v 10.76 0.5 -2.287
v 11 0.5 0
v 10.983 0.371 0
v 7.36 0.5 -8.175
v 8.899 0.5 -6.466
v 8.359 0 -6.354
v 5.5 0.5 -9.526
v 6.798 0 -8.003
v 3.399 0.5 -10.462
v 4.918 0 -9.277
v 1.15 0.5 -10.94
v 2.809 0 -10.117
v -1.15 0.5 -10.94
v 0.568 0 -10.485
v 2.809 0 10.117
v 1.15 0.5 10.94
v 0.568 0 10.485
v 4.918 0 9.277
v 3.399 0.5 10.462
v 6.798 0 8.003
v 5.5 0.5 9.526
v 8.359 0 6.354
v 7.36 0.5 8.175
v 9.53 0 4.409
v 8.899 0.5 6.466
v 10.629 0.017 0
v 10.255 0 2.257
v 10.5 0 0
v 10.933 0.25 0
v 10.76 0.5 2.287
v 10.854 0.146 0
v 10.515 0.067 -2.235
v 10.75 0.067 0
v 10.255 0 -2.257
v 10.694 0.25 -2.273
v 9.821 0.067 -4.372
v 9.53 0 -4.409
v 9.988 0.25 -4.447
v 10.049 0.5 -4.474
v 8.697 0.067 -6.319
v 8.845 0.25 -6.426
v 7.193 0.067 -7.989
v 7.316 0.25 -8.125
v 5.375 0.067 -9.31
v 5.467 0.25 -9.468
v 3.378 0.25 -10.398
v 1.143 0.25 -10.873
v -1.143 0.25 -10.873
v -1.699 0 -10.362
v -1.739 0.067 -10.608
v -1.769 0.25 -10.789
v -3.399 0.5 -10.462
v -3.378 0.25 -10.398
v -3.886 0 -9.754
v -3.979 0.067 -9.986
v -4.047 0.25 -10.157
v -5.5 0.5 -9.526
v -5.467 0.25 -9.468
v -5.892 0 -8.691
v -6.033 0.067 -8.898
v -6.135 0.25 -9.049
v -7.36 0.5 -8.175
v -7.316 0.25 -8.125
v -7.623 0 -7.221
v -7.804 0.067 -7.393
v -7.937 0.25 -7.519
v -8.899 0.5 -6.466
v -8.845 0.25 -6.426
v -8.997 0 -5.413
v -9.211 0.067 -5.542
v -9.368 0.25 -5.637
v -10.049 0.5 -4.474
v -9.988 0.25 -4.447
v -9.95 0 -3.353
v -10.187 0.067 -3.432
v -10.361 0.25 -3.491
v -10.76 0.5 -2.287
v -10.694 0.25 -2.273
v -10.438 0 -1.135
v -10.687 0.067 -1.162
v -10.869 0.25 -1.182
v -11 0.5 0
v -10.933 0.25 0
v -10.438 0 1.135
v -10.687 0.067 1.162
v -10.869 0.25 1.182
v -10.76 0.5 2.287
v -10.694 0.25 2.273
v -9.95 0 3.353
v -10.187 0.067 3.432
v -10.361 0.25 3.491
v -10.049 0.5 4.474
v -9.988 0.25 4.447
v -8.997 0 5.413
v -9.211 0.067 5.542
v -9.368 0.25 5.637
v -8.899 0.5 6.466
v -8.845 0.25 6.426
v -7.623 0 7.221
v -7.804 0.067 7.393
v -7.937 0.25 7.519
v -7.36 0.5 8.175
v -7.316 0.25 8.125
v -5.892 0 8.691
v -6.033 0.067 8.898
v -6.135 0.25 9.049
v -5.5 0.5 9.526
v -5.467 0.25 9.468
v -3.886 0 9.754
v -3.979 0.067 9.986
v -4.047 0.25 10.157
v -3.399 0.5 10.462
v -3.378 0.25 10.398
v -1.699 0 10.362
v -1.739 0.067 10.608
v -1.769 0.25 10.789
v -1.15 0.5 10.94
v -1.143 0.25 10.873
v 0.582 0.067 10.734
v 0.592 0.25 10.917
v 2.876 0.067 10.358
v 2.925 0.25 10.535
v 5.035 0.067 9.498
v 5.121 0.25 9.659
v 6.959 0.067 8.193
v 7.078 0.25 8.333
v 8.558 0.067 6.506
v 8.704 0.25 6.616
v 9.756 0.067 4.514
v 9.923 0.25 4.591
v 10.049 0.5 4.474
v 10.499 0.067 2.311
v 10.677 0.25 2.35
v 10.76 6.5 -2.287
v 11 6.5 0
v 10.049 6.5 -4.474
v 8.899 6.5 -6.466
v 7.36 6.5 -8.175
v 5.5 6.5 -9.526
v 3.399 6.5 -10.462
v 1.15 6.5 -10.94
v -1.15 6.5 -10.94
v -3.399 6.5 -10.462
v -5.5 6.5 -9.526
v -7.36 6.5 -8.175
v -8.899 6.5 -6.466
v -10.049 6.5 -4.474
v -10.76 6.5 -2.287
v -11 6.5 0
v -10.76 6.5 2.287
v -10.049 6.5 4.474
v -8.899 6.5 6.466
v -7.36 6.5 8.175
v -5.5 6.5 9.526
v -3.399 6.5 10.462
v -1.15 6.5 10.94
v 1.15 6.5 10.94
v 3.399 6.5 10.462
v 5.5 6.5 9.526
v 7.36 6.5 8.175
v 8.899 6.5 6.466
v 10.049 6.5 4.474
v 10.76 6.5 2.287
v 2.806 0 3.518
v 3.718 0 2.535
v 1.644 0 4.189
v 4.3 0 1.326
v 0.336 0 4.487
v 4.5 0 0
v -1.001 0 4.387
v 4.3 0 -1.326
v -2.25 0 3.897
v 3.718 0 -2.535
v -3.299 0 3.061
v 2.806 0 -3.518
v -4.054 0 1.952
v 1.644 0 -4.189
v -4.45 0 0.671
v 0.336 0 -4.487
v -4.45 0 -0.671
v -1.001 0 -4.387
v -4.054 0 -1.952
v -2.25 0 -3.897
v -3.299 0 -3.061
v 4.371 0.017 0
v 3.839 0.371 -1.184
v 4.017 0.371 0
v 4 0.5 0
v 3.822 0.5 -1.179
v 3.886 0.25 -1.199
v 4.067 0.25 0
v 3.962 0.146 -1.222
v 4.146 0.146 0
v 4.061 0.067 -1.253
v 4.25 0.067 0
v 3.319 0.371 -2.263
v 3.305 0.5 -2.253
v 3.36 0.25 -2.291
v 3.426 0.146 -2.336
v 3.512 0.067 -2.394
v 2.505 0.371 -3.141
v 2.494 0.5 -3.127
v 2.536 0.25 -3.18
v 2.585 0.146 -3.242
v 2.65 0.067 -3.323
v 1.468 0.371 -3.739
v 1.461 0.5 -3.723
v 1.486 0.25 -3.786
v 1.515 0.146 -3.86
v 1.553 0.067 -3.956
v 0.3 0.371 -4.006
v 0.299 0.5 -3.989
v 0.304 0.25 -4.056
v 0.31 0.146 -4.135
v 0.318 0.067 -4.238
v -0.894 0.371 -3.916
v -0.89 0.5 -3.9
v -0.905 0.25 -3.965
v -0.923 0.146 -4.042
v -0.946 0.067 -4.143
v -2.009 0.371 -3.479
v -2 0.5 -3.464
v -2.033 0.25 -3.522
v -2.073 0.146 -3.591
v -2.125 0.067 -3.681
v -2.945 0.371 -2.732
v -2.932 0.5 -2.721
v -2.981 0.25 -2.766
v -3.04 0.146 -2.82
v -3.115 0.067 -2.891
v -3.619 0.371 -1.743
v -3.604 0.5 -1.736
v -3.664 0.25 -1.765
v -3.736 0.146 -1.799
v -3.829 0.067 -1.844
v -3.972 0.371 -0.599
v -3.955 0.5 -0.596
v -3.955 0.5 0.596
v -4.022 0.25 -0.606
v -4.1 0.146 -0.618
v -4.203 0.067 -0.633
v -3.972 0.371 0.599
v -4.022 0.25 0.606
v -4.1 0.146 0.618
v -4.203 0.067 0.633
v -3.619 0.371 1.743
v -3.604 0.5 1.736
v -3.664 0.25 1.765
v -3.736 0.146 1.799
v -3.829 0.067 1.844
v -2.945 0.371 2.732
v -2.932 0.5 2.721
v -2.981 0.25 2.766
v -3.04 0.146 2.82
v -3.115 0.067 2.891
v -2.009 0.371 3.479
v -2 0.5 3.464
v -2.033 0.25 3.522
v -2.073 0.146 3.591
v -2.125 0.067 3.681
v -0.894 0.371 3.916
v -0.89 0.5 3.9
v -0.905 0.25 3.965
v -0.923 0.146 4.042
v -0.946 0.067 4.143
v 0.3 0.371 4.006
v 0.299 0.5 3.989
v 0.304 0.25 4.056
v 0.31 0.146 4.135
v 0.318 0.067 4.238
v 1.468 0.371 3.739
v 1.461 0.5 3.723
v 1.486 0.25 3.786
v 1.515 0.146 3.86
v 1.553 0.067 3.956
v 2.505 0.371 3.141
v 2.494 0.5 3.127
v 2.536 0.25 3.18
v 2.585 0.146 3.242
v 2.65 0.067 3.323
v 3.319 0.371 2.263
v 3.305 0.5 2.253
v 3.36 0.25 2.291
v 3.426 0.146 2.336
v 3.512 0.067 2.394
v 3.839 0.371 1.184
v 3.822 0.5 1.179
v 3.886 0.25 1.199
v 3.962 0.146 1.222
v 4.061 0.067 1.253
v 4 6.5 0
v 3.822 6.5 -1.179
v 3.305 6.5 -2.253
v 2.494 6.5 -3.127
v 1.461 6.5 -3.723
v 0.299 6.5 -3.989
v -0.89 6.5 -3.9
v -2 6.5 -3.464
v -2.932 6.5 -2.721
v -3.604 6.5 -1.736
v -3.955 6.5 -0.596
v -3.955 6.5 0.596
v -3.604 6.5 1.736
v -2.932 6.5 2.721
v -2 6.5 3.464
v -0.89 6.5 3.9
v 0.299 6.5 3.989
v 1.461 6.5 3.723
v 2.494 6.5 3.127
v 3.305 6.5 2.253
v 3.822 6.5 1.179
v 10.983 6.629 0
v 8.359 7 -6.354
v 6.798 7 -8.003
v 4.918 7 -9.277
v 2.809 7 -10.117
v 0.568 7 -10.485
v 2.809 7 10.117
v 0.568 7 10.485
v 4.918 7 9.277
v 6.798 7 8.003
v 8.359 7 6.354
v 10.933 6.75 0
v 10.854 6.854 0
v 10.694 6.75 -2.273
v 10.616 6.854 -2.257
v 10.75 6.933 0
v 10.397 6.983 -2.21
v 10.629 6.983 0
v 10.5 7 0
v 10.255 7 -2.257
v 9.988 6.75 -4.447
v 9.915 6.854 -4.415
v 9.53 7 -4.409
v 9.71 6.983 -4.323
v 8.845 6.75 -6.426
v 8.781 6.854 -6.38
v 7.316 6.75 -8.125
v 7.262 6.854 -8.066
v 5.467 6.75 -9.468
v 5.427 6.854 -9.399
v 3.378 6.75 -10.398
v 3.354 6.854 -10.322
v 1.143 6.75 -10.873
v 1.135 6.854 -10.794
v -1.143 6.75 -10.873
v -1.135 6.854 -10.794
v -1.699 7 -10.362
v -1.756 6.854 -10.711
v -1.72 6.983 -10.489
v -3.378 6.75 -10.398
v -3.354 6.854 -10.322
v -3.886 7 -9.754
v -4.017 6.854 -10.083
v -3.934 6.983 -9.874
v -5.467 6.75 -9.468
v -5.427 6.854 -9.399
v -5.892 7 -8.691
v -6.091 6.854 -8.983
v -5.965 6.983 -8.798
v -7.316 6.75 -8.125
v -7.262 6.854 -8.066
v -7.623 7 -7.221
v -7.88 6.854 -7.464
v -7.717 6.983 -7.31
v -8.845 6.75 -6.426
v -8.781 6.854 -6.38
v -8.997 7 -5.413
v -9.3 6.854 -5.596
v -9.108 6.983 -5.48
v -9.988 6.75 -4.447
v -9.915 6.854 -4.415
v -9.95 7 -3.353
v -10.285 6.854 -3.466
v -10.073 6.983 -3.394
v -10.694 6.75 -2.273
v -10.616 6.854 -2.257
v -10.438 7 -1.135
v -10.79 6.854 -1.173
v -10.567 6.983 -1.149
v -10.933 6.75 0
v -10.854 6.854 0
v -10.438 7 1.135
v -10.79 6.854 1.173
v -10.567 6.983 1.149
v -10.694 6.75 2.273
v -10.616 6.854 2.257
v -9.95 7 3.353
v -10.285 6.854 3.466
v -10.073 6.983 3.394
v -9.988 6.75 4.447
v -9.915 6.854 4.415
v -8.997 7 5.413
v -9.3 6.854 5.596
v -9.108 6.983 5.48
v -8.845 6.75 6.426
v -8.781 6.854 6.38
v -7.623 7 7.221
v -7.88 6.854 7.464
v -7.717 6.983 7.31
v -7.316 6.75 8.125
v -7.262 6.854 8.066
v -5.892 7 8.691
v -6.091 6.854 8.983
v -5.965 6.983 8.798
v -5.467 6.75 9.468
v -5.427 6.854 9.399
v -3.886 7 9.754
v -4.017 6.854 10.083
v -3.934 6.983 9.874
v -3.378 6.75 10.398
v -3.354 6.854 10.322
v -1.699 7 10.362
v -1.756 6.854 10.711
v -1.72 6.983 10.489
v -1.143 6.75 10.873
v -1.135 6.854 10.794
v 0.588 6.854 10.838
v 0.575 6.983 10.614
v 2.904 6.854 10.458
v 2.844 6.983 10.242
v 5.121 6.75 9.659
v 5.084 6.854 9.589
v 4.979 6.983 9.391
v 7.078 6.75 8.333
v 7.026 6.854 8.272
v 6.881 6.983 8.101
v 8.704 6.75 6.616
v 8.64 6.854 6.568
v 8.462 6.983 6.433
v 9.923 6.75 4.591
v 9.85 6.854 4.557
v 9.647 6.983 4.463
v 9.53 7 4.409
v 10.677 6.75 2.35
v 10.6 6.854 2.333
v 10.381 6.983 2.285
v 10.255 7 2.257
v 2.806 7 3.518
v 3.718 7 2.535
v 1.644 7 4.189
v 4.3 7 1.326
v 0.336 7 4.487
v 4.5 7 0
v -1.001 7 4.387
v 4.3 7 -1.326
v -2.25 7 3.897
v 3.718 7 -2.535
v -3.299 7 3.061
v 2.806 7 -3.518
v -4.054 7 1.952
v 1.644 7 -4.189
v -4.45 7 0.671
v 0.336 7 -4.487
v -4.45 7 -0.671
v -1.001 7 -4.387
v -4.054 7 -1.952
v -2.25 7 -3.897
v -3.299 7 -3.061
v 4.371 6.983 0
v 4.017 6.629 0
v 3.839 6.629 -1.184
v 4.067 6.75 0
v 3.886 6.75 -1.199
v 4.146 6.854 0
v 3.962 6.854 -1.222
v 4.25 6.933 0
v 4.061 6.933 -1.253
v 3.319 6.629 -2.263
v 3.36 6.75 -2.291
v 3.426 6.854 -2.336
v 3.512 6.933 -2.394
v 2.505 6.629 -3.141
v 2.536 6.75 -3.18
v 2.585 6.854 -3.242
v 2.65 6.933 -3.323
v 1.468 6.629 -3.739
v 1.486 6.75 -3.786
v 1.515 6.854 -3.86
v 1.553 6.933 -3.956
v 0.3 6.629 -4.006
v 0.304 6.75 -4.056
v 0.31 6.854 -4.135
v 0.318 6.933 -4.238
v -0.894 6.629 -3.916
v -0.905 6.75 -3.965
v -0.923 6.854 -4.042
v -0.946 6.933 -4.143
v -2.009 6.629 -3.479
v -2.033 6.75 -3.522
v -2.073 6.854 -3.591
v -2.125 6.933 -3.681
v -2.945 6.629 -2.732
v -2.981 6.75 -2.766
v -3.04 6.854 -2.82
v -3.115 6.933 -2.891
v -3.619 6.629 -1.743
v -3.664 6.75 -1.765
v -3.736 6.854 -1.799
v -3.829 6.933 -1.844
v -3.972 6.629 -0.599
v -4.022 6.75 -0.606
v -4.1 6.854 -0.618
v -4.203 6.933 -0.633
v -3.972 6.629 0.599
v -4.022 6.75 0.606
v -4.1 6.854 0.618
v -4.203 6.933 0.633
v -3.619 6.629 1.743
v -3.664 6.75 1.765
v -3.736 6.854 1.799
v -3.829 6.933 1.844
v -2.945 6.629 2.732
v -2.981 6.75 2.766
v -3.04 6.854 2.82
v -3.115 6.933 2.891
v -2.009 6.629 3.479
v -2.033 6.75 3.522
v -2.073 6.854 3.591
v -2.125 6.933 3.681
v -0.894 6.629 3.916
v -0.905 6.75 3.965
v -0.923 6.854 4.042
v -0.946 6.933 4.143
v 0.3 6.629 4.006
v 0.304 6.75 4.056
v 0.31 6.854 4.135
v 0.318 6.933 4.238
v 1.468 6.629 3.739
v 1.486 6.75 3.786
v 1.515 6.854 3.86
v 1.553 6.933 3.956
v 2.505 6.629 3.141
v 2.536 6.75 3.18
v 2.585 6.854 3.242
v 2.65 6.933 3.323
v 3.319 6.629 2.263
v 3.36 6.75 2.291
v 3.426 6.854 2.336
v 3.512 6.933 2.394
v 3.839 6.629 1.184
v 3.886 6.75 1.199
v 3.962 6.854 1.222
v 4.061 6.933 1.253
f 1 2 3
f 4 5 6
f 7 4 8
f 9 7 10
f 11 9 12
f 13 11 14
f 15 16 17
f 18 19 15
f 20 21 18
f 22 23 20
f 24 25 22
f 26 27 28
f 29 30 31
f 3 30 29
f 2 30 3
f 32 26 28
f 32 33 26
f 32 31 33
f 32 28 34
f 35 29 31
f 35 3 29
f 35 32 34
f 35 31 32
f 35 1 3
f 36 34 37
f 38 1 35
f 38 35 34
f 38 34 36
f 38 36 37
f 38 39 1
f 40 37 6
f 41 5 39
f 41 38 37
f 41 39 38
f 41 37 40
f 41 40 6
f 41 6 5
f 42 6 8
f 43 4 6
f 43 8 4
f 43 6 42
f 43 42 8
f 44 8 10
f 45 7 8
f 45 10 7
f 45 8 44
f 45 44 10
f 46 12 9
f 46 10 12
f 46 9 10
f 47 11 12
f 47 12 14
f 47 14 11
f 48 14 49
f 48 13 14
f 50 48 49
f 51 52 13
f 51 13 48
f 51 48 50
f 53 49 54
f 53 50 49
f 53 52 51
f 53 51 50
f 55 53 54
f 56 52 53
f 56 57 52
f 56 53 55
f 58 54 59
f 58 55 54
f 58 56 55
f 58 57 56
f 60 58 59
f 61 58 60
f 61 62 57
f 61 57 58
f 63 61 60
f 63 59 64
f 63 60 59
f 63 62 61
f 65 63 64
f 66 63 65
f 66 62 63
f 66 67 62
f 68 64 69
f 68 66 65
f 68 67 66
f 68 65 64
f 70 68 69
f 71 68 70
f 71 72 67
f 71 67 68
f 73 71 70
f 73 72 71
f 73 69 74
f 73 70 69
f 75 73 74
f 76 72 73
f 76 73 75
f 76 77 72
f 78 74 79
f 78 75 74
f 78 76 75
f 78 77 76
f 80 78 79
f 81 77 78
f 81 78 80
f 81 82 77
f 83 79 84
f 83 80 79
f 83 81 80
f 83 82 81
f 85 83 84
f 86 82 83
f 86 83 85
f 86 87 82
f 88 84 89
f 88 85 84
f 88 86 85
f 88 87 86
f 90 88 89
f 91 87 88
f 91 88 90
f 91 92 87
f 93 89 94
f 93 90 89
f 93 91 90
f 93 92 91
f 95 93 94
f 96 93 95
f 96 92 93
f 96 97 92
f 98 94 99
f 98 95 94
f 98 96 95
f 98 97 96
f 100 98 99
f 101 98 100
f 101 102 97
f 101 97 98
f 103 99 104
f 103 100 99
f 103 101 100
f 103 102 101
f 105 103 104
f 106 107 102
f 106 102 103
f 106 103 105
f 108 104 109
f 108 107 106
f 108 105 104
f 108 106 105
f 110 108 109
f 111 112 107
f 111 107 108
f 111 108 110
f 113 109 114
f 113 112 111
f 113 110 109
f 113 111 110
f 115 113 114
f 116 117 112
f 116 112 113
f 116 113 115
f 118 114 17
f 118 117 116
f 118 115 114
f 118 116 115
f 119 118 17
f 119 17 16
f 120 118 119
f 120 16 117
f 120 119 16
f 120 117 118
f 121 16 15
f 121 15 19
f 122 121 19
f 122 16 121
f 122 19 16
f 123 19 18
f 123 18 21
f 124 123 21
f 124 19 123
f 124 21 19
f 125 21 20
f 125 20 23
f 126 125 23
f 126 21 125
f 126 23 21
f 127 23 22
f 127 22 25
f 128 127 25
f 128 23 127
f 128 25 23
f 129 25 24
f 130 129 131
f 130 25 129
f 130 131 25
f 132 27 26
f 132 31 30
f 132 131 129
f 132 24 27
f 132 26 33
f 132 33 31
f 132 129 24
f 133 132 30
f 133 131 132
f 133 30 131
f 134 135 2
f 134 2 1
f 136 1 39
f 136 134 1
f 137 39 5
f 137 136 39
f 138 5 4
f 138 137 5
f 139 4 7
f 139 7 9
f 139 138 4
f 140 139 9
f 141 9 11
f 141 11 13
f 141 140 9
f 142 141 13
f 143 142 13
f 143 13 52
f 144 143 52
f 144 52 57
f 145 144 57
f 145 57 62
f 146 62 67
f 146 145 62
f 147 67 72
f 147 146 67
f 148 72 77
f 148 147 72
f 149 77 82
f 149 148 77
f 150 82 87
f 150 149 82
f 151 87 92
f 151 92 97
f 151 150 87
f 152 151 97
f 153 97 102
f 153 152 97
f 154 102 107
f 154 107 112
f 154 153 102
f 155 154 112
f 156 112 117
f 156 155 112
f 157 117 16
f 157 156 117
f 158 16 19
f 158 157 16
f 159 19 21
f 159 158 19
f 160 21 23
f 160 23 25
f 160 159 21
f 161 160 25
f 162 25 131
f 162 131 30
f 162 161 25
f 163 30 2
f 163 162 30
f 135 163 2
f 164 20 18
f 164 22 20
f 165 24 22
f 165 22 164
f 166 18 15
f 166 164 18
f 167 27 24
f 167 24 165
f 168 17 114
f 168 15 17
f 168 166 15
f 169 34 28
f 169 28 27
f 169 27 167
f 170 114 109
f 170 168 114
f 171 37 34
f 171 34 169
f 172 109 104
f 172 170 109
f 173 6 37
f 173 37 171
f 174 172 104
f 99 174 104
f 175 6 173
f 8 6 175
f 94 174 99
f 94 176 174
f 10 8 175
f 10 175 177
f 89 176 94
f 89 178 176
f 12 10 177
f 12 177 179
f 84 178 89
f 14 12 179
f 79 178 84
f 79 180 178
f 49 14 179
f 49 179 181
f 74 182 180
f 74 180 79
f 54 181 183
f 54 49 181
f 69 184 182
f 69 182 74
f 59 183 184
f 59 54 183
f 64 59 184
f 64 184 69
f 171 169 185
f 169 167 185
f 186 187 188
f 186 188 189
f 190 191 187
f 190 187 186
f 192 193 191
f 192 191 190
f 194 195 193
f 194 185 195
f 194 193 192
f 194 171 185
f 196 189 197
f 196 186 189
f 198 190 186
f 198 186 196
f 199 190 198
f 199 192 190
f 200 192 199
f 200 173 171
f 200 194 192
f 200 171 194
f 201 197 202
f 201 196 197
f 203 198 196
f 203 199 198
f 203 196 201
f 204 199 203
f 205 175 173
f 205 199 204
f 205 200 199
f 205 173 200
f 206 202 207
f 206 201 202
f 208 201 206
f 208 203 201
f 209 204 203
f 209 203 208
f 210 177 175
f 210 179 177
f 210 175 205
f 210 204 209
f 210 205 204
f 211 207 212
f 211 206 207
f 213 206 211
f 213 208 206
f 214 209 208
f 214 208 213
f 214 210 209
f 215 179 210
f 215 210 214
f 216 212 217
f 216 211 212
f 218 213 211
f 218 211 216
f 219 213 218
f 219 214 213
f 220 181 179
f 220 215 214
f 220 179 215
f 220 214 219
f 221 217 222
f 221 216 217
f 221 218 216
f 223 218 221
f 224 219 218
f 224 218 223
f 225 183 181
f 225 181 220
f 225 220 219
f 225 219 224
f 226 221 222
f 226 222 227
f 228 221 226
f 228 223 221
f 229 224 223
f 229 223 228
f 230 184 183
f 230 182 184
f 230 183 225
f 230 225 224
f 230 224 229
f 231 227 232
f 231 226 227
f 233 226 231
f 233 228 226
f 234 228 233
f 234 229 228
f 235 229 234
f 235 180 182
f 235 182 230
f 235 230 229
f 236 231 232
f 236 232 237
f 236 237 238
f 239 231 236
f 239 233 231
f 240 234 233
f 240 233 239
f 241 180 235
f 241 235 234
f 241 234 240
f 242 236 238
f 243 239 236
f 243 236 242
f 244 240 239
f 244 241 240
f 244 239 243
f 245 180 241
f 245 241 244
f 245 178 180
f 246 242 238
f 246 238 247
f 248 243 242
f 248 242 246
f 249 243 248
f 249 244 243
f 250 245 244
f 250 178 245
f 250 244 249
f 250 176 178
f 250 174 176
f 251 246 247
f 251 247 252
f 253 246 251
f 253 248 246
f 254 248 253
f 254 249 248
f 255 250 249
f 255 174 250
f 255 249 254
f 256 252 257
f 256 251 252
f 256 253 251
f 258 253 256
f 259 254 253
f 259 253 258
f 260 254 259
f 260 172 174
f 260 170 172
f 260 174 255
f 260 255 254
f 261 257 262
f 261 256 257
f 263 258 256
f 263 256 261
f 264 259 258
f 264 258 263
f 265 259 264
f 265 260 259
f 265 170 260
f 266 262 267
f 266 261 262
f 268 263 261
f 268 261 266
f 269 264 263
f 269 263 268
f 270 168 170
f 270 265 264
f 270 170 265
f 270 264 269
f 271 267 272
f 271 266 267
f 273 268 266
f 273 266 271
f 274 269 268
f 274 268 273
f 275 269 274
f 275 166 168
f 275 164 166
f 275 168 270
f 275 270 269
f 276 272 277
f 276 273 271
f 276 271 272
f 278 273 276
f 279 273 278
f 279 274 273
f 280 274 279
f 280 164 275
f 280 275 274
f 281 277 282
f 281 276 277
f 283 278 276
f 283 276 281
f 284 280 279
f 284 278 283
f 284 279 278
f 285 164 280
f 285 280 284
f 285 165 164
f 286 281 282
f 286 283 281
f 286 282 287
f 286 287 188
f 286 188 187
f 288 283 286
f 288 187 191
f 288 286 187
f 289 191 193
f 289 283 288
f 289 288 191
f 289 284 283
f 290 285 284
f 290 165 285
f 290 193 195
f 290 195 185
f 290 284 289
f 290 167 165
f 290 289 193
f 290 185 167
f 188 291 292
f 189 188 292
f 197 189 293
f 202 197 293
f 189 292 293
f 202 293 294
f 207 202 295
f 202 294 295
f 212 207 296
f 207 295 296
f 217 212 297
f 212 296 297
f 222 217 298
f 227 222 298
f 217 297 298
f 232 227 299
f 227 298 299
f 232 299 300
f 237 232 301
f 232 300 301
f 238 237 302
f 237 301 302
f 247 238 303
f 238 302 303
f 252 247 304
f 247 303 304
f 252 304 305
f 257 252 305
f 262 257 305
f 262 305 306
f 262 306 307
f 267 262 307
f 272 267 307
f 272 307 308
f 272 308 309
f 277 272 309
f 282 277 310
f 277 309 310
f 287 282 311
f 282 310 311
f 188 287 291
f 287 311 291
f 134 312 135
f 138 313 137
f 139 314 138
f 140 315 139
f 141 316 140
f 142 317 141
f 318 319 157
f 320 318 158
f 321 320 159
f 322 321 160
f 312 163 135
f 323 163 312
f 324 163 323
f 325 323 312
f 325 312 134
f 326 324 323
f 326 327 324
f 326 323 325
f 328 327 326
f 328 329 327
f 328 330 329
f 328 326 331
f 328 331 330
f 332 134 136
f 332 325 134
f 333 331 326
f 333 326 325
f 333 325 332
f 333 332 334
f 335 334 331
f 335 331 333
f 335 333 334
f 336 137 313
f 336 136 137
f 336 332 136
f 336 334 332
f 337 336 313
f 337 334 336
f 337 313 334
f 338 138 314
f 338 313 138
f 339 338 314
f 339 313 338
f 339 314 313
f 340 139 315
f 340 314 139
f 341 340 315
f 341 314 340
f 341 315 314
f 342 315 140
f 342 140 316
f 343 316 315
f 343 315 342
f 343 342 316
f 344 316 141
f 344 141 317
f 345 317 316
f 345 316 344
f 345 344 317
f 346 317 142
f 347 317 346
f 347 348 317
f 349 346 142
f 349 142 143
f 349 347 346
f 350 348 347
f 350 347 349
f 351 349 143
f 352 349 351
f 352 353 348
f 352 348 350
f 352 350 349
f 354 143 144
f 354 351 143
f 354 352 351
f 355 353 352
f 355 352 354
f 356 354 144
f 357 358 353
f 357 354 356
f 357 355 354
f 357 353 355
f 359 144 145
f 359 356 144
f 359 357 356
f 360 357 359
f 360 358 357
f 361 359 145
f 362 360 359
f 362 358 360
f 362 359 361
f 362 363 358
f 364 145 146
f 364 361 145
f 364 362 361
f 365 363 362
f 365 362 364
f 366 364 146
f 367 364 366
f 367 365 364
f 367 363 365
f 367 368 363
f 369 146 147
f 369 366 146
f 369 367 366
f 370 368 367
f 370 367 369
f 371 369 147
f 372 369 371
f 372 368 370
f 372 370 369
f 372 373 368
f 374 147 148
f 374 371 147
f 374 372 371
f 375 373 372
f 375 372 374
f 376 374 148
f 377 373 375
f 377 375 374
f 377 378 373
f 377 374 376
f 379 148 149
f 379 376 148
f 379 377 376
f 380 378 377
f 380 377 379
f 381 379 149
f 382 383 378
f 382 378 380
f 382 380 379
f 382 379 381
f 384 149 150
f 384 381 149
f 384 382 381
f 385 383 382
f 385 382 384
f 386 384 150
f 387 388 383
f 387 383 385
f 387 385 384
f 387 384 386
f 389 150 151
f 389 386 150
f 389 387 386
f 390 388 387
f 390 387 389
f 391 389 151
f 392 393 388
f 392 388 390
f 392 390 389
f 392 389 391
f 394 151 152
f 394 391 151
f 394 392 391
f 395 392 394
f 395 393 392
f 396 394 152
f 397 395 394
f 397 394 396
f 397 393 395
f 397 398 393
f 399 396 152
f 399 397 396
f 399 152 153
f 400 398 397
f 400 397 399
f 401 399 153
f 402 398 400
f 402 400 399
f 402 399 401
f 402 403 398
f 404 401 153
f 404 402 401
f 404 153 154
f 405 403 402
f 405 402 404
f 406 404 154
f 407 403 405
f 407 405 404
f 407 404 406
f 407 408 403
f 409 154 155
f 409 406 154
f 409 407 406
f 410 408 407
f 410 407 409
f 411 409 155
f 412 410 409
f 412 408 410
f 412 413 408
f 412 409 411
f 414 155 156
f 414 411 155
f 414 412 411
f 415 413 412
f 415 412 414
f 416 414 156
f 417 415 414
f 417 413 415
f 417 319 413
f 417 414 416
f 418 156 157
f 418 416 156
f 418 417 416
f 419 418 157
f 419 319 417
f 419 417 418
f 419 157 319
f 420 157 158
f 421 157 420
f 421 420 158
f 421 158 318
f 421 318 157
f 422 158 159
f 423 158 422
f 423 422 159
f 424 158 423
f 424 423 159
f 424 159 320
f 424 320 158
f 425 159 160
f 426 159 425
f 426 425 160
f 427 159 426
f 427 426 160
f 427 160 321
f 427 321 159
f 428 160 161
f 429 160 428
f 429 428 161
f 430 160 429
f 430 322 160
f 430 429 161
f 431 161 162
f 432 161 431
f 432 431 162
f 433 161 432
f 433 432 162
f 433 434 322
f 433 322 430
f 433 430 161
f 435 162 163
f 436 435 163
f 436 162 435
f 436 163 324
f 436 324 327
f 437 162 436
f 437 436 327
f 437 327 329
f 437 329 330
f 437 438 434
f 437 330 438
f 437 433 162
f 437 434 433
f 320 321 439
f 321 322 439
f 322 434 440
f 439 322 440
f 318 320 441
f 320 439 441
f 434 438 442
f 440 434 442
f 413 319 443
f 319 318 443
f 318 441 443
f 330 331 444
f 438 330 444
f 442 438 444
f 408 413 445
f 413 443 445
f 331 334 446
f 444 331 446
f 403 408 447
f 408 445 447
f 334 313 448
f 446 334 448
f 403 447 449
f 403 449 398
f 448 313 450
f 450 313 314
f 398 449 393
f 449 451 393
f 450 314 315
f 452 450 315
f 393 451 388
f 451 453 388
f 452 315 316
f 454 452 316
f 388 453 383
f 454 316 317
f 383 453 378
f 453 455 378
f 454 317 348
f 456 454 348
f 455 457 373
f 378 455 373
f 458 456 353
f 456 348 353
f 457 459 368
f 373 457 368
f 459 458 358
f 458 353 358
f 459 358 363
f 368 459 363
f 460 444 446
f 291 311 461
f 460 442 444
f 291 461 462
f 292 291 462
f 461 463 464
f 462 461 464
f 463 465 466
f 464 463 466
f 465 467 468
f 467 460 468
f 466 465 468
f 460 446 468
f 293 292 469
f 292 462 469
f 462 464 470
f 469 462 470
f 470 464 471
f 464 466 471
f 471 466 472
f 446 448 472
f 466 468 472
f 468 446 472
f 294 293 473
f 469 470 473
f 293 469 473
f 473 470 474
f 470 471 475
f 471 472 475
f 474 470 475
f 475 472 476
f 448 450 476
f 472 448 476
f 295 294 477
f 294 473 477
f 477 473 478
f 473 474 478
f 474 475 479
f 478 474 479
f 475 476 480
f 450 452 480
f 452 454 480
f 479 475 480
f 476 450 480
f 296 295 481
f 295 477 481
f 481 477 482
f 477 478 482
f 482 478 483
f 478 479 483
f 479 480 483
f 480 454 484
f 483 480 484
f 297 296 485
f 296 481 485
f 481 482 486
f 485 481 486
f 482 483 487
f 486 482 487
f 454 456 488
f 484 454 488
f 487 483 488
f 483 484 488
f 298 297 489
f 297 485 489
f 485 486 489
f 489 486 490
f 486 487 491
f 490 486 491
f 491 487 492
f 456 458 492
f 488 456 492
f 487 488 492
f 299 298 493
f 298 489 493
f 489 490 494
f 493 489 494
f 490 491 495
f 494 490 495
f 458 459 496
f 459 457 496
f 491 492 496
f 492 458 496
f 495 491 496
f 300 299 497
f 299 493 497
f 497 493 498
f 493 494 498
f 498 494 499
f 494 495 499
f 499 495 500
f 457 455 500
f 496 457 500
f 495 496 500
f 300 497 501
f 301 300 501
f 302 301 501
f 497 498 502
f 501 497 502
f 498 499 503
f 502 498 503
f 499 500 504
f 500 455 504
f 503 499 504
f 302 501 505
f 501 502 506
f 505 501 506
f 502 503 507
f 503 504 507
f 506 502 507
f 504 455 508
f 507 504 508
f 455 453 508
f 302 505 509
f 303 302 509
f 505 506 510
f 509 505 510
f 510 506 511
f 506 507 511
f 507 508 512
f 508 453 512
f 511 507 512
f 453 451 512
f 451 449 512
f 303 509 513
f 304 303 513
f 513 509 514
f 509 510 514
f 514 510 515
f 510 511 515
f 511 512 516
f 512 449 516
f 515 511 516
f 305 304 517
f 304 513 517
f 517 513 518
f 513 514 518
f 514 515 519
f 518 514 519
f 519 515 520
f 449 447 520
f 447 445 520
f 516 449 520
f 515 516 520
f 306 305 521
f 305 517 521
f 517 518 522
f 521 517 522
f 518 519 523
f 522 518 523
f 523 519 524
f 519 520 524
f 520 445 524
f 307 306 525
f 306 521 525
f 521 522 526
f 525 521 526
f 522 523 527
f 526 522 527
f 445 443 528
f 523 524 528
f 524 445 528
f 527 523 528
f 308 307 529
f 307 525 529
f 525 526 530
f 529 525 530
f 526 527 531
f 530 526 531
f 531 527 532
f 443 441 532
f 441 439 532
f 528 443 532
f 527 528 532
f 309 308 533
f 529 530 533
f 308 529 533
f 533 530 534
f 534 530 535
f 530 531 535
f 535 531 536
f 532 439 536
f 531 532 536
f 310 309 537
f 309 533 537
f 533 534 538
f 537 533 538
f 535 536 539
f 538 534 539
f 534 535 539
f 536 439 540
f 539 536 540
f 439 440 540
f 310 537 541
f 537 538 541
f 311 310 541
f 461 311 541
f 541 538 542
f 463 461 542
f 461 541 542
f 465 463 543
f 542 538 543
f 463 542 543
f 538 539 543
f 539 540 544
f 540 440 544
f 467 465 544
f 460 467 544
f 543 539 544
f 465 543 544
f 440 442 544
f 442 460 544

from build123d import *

# Parameters (mm, degrees)
ESQUISSE1_W = 7
ESQUISSE1_H = 7
CONG_1_R    = 0.5


with BuildPart() as part:
    # Esquisse1 → Révolution1 (revolve)
    with BuildSketch(Plane.XY):
        with Locations((7.5, 3.5)):
            Rectangle(ESQUISSE1_W, ESQUISSE1_H)
    revolve(axis=Axis((0, 0, 0), (0, 1, 0)))

    # Congé1
    cong_1_edges = [part.edges().sort_by_distance(p)[0] for p in [
        (-4, 0, 0),
        (-11, 0, 0),
        (-11, 7, 0),
        (-4, 7, 0),
    ]]
    fillet(cong_1_edges, radius=CONG_1_R)


solid = part.part
